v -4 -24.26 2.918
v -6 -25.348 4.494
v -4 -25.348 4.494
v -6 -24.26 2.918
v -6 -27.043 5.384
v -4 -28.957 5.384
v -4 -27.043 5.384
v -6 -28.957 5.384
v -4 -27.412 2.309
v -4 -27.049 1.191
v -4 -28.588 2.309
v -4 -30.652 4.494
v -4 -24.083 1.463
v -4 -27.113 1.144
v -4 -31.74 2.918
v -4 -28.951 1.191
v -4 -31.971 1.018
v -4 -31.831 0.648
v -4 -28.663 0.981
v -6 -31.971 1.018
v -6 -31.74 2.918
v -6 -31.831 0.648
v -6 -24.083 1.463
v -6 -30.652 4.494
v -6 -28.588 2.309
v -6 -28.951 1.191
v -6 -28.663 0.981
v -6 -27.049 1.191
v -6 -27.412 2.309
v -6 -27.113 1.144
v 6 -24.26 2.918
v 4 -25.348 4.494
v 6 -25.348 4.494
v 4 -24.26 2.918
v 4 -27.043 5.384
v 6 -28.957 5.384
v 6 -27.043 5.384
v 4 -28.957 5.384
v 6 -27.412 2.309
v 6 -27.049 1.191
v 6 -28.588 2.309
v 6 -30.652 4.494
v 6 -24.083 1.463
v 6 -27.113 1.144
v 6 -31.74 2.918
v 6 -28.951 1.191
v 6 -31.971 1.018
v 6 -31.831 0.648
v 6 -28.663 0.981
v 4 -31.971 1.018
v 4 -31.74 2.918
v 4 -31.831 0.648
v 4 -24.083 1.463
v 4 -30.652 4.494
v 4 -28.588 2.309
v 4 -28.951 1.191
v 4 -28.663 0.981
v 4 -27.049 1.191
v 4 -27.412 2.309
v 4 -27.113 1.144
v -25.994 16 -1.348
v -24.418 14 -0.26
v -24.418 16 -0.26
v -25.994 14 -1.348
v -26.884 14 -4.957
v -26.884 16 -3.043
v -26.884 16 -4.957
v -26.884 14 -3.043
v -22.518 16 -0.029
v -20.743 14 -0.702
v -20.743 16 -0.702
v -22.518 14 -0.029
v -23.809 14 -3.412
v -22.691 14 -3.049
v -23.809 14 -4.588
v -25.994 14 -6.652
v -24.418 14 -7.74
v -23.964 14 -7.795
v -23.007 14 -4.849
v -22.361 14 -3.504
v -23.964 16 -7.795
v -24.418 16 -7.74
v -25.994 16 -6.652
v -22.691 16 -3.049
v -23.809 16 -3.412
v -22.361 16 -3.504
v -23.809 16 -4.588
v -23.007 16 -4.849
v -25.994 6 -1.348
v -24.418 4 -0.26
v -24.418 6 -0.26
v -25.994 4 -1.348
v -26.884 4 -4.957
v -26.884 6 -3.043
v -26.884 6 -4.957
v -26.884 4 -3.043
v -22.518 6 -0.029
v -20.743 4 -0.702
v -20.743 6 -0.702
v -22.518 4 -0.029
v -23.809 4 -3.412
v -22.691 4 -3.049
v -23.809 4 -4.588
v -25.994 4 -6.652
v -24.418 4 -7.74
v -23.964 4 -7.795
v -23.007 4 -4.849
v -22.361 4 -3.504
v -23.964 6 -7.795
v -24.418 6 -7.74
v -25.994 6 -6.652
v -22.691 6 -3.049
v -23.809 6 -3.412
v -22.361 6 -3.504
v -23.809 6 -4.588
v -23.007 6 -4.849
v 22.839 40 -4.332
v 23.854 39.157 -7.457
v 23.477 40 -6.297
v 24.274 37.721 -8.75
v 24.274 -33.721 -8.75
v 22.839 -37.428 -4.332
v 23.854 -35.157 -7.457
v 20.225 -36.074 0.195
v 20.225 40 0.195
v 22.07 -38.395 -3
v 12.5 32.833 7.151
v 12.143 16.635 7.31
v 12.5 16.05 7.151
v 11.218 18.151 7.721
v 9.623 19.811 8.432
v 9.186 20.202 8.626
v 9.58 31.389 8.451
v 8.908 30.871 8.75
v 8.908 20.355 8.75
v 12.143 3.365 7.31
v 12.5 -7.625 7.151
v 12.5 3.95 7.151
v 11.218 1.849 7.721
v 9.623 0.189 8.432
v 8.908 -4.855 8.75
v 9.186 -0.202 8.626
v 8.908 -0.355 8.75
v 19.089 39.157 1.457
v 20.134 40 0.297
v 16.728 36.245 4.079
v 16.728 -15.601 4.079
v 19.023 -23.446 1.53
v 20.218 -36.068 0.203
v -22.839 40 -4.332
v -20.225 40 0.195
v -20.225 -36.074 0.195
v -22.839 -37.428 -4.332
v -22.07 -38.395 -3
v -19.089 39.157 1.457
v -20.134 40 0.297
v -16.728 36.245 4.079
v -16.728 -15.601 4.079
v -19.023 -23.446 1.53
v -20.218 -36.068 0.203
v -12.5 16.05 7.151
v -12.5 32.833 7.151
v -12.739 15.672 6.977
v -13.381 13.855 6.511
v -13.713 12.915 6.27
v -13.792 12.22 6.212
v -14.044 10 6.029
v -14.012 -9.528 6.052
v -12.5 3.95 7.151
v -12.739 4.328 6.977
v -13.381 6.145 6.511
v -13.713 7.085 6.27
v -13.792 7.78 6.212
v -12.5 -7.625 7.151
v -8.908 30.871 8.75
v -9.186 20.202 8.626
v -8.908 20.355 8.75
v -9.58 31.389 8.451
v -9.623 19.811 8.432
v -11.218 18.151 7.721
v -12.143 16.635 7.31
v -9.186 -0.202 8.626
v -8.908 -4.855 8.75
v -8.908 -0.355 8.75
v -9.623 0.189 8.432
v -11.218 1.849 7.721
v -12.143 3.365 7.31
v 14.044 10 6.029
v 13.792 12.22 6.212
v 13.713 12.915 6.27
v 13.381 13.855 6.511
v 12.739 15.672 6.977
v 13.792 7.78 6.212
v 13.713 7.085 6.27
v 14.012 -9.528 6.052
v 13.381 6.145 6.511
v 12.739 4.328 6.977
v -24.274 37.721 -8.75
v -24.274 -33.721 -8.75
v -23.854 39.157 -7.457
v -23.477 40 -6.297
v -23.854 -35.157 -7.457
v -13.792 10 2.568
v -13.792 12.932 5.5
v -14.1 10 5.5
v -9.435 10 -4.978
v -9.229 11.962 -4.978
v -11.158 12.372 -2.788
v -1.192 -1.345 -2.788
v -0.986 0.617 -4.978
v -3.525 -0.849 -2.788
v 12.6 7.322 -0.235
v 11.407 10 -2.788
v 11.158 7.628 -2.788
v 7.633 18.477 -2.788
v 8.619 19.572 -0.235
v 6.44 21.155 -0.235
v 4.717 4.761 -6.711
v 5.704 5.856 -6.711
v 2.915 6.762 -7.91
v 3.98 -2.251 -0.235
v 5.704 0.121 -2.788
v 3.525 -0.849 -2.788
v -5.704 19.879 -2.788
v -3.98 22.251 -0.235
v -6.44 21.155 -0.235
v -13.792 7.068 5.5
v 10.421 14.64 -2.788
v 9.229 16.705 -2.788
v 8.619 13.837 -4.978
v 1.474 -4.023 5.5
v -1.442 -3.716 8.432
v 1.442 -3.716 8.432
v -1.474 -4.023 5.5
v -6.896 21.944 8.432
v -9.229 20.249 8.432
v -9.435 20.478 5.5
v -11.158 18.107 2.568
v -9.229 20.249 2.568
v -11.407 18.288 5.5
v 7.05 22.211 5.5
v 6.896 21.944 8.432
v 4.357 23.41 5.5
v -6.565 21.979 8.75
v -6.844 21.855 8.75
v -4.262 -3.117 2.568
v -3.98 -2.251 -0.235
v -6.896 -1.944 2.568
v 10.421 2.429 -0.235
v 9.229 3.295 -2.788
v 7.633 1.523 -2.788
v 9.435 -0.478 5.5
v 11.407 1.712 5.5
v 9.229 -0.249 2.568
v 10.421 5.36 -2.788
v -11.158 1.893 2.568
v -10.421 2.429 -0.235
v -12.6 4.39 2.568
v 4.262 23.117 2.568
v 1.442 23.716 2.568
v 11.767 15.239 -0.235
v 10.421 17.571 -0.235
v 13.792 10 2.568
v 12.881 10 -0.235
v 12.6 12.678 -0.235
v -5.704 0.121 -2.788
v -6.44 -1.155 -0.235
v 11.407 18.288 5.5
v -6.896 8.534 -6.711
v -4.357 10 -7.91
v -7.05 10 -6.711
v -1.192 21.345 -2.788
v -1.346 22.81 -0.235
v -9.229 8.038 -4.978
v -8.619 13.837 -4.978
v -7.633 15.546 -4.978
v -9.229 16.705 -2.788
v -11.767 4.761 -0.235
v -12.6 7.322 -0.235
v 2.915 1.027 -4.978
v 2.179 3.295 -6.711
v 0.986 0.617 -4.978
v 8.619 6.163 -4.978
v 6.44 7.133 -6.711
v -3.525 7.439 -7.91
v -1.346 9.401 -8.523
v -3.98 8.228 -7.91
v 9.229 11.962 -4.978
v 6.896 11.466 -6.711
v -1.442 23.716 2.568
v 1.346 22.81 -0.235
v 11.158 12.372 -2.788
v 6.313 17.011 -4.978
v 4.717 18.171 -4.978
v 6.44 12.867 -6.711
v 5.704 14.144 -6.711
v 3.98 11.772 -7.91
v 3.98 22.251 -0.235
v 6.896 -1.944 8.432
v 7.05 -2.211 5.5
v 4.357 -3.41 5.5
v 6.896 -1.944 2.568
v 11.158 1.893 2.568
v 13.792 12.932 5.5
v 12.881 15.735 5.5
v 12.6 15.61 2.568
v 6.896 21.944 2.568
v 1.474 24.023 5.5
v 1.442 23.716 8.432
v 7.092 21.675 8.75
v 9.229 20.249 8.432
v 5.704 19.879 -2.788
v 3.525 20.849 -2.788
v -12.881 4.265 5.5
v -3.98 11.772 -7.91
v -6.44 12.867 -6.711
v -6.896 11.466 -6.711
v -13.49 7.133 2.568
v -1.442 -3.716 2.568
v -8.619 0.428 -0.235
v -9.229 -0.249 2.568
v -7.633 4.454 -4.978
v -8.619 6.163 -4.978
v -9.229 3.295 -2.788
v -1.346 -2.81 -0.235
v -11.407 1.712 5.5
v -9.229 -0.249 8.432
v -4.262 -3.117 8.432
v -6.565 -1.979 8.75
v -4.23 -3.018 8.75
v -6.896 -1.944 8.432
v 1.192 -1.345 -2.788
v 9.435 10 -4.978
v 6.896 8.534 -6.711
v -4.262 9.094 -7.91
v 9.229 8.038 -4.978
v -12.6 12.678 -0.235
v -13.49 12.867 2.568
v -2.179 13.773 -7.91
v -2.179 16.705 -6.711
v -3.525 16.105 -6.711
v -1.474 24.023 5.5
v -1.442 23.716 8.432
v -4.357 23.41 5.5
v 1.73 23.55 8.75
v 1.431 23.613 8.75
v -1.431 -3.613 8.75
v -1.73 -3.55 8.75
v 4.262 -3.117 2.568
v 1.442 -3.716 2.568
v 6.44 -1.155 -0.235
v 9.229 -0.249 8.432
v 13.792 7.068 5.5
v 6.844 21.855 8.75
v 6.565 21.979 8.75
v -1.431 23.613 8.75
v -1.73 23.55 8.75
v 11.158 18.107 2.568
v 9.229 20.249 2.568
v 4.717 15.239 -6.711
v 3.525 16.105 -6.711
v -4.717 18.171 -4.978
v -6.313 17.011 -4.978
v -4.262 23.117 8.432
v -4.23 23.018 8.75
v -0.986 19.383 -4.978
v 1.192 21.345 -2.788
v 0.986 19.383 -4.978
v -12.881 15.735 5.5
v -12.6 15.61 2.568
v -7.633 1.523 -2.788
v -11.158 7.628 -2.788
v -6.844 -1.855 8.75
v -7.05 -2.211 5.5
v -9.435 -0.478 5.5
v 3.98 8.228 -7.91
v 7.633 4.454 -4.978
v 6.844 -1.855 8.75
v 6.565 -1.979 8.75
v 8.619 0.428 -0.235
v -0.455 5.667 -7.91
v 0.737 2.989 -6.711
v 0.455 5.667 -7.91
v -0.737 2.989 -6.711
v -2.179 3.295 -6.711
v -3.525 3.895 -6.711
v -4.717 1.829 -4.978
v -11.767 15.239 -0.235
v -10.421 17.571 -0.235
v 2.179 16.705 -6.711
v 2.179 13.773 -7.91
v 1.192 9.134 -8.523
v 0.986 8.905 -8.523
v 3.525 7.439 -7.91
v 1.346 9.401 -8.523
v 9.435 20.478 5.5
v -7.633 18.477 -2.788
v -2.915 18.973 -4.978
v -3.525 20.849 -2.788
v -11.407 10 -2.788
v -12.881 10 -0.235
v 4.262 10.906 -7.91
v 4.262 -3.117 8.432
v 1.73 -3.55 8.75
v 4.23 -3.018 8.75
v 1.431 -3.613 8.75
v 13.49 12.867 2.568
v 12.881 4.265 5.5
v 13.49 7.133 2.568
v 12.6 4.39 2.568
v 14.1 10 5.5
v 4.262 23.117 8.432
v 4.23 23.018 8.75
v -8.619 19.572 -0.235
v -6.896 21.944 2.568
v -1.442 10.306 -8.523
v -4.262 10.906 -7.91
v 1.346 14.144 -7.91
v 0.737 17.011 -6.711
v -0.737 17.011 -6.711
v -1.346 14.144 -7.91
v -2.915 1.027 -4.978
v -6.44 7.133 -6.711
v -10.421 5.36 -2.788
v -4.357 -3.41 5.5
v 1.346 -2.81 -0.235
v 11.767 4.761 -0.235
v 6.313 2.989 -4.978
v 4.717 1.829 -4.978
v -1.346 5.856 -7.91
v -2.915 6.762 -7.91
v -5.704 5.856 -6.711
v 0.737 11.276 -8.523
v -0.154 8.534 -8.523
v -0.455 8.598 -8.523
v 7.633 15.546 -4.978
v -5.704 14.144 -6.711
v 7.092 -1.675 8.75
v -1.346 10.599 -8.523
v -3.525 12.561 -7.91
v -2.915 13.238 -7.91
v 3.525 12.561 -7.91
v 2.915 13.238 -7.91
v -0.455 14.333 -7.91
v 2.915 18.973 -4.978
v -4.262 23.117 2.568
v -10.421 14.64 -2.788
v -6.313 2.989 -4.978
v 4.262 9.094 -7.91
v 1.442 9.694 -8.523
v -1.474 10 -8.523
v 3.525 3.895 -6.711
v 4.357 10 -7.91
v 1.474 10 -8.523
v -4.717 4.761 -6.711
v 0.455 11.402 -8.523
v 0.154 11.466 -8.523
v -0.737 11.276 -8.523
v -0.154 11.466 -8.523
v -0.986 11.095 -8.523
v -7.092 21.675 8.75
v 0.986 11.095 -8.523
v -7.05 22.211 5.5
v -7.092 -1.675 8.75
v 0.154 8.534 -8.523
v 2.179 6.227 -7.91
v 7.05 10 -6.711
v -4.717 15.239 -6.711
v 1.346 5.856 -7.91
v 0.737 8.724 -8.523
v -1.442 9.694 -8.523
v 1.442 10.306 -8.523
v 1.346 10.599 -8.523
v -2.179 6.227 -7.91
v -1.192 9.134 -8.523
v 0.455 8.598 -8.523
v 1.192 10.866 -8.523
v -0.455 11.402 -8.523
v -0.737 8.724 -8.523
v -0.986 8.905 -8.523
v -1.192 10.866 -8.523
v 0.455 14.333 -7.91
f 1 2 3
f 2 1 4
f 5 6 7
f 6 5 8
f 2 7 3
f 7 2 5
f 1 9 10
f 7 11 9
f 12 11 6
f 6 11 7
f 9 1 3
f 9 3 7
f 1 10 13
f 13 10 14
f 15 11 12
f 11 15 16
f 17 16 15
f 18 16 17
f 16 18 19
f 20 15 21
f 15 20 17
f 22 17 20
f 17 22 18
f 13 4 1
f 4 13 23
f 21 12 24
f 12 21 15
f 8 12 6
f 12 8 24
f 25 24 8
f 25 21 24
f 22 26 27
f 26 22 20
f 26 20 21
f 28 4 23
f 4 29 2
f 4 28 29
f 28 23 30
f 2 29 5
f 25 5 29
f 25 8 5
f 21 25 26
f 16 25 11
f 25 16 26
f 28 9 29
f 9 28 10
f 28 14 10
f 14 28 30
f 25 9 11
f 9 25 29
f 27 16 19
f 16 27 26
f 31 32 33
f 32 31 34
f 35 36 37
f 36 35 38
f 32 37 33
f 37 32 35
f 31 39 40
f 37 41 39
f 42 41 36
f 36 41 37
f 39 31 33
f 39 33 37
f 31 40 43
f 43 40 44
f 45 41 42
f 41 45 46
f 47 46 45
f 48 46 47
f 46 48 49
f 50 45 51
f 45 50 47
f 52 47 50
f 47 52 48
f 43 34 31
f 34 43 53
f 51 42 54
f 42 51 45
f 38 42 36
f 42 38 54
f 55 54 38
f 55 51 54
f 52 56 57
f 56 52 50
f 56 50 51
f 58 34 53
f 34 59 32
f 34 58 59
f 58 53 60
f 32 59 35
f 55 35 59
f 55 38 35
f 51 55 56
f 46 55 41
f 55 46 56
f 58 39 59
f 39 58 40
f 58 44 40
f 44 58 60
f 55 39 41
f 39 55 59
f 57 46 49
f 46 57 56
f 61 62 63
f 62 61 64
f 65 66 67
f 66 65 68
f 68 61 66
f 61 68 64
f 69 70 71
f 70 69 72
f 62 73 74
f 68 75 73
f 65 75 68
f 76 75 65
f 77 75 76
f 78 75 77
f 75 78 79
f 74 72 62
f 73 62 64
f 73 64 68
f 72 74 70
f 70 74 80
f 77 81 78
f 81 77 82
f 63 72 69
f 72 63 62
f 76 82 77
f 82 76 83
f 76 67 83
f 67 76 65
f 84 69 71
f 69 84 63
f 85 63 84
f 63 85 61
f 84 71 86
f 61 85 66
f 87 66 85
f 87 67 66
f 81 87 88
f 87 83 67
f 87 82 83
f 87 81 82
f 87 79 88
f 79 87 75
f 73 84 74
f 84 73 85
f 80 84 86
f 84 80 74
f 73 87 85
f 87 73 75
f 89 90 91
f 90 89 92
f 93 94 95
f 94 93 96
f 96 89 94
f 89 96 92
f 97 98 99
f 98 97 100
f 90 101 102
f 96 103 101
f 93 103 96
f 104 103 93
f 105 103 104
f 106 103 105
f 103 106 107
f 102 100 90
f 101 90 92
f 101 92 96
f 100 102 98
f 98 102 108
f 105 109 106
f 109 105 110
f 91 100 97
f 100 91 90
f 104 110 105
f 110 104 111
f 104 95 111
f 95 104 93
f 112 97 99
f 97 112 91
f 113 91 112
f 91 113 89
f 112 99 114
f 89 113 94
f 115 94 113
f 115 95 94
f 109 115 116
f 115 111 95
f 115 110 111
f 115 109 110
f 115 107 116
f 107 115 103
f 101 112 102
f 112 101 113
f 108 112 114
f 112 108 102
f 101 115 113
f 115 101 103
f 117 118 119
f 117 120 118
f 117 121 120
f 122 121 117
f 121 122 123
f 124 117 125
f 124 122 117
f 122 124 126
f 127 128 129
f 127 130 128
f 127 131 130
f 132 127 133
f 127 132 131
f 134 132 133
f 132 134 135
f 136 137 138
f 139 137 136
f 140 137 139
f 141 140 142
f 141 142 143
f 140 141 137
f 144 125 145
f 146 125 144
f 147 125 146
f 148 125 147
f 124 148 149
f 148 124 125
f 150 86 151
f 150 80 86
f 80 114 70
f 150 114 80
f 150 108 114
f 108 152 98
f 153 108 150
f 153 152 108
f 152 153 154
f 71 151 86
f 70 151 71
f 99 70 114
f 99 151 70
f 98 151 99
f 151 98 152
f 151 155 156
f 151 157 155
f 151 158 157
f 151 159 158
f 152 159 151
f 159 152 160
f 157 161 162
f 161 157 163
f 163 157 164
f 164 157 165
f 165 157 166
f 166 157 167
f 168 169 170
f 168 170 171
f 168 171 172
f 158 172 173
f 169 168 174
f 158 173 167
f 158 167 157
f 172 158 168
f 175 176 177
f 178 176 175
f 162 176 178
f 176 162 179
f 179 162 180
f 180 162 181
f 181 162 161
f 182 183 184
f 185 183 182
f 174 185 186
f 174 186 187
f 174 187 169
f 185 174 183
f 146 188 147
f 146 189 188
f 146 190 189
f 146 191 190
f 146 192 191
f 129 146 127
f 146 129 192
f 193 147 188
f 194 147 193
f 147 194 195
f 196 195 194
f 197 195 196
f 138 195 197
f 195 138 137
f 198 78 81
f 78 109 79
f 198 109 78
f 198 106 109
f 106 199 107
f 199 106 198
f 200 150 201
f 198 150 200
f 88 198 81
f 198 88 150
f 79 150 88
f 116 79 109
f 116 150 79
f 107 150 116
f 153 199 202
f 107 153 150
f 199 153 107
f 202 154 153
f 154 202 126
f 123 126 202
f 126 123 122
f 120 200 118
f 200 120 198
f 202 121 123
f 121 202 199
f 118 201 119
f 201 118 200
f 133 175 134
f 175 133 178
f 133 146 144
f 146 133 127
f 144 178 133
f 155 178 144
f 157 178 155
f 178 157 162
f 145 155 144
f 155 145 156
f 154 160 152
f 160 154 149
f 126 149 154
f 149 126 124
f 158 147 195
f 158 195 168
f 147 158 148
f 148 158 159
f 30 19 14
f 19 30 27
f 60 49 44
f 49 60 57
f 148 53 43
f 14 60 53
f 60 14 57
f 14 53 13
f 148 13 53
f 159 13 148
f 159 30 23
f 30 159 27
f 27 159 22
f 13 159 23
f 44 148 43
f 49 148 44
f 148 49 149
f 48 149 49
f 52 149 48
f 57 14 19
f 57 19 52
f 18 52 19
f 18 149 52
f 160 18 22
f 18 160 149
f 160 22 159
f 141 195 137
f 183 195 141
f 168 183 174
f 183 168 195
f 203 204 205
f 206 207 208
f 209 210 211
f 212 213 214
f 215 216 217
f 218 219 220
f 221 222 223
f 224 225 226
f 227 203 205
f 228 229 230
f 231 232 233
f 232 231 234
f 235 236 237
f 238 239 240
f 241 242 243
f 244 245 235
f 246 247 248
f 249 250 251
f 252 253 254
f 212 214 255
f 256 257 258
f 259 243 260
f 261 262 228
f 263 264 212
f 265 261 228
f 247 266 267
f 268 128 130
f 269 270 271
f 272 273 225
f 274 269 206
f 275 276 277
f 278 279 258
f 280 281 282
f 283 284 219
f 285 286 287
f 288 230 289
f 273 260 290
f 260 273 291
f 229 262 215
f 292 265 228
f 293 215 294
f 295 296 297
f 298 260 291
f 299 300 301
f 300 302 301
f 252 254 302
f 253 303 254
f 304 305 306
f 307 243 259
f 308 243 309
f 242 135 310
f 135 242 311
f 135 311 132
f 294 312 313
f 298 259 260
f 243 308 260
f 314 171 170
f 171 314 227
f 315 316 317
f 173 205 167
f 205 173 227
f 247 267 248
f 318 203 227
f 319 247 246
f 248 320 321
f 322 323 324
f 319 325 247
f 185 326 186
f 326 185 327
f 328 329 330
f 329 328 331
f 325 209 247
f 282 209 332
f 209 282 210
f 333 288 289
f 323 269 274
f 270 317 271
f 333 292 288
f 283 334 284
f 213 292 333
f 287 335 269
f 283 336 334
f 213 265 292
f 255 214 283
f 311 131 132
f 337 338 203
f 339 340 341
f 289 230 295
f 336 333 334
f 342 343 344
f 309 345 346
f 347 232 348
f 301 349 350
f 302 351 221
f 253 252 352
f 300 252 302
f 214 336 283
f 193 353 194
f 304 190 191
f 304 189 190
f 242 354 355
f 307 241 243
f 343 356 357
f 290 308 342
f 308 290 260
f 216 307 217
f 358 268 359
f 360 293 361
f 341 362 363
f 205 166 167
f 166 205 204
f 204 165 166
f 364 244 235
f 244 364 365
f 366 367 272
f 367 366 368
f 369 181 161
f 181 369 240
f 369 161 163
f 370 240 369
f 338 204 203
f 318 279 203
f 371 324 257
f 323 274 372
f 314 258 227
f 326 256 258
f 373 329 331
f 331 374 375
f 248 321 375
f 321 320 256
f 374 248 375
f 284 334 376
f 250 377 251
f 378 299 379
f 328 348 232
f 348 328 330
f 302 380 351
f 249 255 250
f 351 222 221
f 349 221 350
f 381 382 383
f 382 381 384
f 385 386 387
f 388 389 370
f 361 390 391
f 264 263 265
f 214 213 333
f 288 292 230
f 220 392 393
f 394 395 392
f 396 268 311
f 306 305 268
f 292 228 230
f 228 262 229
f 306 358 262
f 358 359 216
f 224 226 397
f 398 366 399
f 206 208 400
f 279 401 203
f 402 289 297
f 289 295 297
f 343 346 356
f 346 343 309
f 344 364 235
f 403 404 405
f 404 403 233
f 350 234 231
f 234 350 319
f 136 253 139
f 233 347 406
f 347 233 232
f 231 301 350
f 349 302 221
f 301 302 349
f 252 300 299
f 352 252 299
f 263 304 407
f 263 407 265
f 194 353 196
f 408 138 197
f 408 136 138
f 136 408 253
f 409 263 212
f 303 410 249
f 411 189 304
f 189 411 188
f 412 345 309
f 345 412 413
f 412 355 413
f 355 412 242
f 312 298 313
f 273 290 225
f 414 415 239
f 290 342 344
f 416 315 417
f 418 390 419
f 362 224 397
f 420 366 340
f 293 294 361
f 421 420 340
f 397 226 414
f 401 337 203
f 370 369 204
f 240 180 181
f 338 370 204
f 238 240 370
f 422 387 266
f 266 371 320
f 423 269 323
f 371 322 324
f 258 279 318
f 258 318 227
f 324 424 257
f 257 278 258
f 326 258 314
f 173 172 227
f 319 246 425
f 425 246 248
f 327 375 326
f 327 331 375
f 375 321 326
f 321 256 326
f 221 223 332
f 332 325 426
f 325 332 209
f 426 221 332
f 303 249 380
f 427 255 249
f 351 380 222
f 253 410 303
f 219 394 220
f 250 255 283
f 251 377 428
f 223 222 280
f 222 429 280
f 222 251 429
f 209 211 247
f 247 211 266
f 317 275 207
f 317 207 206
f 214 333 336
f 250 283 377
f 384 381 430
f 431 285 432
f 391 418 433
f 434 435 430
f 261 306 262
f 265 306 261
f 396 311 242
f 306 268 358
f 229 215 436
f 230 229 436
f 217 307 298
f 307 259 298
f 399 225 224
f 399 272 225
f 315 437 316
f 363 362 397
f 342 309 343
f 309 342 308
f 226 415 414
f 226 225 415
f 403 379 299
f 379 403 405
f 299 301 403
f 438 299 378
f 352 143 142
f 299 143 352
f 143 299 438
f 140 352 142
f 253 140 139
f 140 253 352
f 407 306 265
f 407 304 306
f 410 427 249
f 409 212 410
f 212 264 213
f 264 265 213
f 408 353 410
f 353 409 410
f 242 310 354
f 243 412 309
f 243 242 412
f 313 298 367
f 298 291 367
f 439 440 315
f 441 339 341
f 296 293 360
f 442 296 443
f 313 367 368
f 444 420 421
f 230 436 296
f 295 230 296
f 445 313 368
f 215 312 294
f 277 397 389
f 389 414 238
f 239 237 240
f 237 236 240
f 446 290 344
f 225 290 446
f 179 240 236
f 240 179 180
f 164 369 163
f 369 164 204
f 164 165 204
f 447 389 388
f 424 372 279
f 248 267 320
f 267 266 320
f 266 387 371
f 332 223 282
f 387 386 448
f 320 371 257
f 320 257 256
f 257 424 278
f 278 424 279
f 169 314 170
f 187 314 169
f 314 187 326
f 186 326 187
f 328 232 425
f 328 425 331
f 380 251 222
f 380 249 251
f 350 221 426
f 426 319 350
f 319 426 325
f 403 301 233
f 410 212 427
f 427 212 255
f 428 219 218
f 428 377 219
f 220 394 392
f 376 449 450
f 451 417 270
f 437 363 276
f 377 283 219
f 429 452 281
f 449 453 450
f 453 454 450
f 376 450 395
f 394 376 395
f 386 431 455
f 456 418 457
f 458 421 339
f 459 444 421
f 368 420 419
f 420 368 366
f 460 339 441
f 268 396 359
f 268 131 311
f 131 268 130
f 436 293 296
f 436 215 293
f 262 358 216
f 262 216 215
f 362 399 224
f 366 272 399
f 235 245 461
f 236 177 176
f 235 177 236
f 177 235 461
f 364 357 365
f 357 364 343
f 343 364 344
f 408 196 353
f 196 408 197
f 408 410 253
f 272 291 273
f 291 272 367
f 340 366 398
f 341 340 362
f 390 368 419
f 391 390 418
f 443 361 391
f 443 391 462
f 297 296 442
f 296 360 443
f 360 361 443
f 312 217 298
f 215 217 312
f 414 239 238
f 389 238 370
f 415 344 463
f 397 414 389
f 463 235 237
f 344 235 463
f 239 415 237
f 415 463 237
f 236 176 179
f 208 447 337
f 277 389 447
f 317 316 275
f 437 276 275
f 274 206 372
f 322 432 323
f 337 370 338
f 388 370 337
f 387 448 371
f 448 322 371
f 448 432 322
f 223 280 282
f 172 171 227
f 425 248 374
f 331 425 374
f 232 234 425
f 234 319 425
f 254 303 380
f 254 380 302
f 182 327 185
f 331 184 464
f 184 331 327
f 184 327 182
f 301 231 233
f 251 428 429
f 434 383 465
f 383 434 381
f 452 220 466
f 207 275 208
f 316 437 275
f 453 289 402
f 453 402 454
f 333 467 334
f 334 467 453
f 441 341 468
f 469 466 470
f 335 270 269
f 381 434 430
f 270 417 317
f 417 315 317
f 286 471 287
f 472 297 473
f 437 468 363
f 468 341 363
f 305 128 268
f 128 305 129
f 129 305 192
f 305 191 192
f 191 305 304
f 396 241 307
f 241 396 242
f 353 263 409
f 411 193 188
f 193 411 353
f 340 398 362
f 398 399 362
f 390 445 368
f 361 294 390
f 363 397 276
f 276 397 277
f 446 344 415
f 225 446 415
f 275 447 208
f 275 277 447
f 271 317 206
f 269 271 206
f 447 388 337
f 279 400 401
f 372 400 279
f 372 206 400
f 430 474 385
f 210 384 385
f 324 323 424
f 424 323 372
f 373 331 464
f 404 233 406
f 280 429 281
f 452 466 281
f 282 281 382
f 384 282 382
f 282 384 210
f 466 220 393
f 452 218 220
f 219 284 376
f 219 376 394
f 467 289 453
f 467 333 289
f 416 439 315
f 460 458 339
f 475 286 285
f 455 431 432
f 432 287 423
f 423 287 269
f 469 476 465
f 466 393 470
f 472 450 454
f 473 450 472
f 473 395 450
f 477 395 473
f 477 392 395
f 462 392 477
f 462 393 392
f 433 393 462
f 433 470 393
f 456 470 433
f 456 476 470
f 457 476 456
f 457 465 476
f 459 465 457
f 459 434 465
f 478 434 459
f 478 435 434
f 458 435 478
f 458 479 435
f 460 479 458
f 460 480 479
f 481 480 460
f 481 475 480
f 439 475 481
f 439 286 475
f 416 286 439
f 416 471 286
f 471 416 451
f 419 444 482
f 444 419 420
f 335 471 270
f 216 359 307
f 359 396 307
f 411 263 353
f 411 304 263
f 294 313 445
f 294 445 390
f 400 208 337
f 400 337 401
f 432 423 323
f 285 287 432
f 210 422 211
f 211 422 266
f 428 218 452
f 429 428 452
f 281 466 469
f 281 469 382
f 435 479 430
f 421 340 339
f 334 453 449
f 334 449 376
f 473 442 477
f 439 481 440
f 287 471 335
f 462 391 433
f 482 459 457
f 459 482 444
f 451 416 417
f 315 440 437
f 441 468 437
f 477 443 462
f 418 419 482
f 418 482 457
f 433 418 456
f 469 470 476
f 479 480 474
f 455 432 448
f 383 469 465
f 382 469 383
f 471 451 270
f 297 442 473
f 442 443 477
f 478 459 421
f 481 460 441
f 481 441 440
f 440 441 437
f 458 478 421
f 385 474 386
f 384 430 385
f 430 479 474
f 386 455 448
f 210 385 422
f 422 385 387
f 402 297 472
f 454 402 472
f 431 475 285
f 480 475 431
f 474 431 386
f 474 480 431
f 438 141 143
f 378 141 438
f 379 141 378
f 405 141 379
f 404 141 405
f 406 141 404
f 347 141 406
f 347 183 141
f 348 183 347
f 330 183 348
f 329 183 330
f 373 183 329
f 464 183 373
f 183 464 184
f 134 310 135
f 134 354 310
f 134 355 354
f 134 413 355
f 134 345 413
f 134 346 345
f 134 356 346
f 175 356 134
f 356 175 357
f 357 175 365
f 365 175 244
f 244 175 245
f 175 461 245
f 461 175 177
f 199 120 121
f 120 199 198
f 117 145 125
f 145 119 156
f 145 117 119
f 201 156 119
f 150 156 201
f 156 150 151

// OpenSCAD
module cutaway() {
 
    translate([0,0,-14.5]) {
        rotate([90, 0, 0]){
            difference() {
                cylinder(90,50,50, true);
                cylinder(100,25,25, true);
            }
        }
    }
    
    translate([0,2,26]) {
        rotate([0, 90, 0]){
            difference() {
                cylinder(90,70,70, true);
                cylinder(100,50,50, true);
            }
        }
    }
    /*
    translate([46,4,26]) {
        rotate([0, 0, 90]){
            difference() {
                cylinder(90,90,90, true);
                cylinder(100,70,70, true);
            }
        }
    }
    
    translate([-46,4,26]) {
        rotate([0, 0, 90]){
            difference() {
                cylinder(90,90,90, true);
                cylinder(100,70,70, true);
            }
        }
    }*/
    
    

    
    translate([0, 10, 5.5]) {

        sphere(14.1, true);
        
    }
    
   /* translate([0,2,-75]) {
        rotate([0, 90, 0]){
            difference() {
                cylinder(90,70,70, true);
                cylinder(100,50,50, true);
            }
        }
    }*/
    
    
    translate([0,2,-32]) {
        rotate([0, 90, 0]){
            difference() {
                cylinder(90,70,70, true);
                cylinder(100,50,50, true);
            }
        }
    }
    
    translate([0,-38,70]) {
        rotate([0, 90, 0]){
            difference() {
                cylinder(90,70,70, true);
                cylinder(100,40,40, true);
            }
        }
    }
    /*
    translate([11,30,4]) {
        rotate([0, 0, 90]){
            difference() {
                cylinder(30,5,5, true);
                
            }
        }
    }

translate([-11,30,4]) {
        rotate([0, 0, 90]){
            difference() {
                cylinder(30,5,5, true);
                
            }
        }
    }
    
    translate([8,-22,4]) {
        rotate([0, 0, 90]){
            difference() {
                cylinder(30,8,8, true);
                
            }
        }
    }*/
    
}






translate([-5,-28,1.5]) {
        rotate([0, 90, 0]){
            difference() {
                cylinder(2,4,4, true);
                cylinder(4,1,1, true);
            }
        }
    }
    
    translate([5,-28,1.5]) {
        rotate([0, 90, 0]){
            difference() {
                cylinder(2,4,4, true);
                cylinder(4,1,1, true);
            }
        }
    }
    
    translate([-23,15,-4]) {
        rotate([90, 0, 0]){
            difference() {
                cylinder(2,4,4, true);
                cylinder(4,1,1, true);
            }
        }
    }
    
    translate([-23,5,-4]) {
        rotate([90, 0, 0]){
            difference() {
                cylinder(2,4,4, true);
                cylinder(4,1,1, true);
            }
        }
    }









difference() {

    cube([60, 80, 17.5], true);

    cutaway();
    
}
